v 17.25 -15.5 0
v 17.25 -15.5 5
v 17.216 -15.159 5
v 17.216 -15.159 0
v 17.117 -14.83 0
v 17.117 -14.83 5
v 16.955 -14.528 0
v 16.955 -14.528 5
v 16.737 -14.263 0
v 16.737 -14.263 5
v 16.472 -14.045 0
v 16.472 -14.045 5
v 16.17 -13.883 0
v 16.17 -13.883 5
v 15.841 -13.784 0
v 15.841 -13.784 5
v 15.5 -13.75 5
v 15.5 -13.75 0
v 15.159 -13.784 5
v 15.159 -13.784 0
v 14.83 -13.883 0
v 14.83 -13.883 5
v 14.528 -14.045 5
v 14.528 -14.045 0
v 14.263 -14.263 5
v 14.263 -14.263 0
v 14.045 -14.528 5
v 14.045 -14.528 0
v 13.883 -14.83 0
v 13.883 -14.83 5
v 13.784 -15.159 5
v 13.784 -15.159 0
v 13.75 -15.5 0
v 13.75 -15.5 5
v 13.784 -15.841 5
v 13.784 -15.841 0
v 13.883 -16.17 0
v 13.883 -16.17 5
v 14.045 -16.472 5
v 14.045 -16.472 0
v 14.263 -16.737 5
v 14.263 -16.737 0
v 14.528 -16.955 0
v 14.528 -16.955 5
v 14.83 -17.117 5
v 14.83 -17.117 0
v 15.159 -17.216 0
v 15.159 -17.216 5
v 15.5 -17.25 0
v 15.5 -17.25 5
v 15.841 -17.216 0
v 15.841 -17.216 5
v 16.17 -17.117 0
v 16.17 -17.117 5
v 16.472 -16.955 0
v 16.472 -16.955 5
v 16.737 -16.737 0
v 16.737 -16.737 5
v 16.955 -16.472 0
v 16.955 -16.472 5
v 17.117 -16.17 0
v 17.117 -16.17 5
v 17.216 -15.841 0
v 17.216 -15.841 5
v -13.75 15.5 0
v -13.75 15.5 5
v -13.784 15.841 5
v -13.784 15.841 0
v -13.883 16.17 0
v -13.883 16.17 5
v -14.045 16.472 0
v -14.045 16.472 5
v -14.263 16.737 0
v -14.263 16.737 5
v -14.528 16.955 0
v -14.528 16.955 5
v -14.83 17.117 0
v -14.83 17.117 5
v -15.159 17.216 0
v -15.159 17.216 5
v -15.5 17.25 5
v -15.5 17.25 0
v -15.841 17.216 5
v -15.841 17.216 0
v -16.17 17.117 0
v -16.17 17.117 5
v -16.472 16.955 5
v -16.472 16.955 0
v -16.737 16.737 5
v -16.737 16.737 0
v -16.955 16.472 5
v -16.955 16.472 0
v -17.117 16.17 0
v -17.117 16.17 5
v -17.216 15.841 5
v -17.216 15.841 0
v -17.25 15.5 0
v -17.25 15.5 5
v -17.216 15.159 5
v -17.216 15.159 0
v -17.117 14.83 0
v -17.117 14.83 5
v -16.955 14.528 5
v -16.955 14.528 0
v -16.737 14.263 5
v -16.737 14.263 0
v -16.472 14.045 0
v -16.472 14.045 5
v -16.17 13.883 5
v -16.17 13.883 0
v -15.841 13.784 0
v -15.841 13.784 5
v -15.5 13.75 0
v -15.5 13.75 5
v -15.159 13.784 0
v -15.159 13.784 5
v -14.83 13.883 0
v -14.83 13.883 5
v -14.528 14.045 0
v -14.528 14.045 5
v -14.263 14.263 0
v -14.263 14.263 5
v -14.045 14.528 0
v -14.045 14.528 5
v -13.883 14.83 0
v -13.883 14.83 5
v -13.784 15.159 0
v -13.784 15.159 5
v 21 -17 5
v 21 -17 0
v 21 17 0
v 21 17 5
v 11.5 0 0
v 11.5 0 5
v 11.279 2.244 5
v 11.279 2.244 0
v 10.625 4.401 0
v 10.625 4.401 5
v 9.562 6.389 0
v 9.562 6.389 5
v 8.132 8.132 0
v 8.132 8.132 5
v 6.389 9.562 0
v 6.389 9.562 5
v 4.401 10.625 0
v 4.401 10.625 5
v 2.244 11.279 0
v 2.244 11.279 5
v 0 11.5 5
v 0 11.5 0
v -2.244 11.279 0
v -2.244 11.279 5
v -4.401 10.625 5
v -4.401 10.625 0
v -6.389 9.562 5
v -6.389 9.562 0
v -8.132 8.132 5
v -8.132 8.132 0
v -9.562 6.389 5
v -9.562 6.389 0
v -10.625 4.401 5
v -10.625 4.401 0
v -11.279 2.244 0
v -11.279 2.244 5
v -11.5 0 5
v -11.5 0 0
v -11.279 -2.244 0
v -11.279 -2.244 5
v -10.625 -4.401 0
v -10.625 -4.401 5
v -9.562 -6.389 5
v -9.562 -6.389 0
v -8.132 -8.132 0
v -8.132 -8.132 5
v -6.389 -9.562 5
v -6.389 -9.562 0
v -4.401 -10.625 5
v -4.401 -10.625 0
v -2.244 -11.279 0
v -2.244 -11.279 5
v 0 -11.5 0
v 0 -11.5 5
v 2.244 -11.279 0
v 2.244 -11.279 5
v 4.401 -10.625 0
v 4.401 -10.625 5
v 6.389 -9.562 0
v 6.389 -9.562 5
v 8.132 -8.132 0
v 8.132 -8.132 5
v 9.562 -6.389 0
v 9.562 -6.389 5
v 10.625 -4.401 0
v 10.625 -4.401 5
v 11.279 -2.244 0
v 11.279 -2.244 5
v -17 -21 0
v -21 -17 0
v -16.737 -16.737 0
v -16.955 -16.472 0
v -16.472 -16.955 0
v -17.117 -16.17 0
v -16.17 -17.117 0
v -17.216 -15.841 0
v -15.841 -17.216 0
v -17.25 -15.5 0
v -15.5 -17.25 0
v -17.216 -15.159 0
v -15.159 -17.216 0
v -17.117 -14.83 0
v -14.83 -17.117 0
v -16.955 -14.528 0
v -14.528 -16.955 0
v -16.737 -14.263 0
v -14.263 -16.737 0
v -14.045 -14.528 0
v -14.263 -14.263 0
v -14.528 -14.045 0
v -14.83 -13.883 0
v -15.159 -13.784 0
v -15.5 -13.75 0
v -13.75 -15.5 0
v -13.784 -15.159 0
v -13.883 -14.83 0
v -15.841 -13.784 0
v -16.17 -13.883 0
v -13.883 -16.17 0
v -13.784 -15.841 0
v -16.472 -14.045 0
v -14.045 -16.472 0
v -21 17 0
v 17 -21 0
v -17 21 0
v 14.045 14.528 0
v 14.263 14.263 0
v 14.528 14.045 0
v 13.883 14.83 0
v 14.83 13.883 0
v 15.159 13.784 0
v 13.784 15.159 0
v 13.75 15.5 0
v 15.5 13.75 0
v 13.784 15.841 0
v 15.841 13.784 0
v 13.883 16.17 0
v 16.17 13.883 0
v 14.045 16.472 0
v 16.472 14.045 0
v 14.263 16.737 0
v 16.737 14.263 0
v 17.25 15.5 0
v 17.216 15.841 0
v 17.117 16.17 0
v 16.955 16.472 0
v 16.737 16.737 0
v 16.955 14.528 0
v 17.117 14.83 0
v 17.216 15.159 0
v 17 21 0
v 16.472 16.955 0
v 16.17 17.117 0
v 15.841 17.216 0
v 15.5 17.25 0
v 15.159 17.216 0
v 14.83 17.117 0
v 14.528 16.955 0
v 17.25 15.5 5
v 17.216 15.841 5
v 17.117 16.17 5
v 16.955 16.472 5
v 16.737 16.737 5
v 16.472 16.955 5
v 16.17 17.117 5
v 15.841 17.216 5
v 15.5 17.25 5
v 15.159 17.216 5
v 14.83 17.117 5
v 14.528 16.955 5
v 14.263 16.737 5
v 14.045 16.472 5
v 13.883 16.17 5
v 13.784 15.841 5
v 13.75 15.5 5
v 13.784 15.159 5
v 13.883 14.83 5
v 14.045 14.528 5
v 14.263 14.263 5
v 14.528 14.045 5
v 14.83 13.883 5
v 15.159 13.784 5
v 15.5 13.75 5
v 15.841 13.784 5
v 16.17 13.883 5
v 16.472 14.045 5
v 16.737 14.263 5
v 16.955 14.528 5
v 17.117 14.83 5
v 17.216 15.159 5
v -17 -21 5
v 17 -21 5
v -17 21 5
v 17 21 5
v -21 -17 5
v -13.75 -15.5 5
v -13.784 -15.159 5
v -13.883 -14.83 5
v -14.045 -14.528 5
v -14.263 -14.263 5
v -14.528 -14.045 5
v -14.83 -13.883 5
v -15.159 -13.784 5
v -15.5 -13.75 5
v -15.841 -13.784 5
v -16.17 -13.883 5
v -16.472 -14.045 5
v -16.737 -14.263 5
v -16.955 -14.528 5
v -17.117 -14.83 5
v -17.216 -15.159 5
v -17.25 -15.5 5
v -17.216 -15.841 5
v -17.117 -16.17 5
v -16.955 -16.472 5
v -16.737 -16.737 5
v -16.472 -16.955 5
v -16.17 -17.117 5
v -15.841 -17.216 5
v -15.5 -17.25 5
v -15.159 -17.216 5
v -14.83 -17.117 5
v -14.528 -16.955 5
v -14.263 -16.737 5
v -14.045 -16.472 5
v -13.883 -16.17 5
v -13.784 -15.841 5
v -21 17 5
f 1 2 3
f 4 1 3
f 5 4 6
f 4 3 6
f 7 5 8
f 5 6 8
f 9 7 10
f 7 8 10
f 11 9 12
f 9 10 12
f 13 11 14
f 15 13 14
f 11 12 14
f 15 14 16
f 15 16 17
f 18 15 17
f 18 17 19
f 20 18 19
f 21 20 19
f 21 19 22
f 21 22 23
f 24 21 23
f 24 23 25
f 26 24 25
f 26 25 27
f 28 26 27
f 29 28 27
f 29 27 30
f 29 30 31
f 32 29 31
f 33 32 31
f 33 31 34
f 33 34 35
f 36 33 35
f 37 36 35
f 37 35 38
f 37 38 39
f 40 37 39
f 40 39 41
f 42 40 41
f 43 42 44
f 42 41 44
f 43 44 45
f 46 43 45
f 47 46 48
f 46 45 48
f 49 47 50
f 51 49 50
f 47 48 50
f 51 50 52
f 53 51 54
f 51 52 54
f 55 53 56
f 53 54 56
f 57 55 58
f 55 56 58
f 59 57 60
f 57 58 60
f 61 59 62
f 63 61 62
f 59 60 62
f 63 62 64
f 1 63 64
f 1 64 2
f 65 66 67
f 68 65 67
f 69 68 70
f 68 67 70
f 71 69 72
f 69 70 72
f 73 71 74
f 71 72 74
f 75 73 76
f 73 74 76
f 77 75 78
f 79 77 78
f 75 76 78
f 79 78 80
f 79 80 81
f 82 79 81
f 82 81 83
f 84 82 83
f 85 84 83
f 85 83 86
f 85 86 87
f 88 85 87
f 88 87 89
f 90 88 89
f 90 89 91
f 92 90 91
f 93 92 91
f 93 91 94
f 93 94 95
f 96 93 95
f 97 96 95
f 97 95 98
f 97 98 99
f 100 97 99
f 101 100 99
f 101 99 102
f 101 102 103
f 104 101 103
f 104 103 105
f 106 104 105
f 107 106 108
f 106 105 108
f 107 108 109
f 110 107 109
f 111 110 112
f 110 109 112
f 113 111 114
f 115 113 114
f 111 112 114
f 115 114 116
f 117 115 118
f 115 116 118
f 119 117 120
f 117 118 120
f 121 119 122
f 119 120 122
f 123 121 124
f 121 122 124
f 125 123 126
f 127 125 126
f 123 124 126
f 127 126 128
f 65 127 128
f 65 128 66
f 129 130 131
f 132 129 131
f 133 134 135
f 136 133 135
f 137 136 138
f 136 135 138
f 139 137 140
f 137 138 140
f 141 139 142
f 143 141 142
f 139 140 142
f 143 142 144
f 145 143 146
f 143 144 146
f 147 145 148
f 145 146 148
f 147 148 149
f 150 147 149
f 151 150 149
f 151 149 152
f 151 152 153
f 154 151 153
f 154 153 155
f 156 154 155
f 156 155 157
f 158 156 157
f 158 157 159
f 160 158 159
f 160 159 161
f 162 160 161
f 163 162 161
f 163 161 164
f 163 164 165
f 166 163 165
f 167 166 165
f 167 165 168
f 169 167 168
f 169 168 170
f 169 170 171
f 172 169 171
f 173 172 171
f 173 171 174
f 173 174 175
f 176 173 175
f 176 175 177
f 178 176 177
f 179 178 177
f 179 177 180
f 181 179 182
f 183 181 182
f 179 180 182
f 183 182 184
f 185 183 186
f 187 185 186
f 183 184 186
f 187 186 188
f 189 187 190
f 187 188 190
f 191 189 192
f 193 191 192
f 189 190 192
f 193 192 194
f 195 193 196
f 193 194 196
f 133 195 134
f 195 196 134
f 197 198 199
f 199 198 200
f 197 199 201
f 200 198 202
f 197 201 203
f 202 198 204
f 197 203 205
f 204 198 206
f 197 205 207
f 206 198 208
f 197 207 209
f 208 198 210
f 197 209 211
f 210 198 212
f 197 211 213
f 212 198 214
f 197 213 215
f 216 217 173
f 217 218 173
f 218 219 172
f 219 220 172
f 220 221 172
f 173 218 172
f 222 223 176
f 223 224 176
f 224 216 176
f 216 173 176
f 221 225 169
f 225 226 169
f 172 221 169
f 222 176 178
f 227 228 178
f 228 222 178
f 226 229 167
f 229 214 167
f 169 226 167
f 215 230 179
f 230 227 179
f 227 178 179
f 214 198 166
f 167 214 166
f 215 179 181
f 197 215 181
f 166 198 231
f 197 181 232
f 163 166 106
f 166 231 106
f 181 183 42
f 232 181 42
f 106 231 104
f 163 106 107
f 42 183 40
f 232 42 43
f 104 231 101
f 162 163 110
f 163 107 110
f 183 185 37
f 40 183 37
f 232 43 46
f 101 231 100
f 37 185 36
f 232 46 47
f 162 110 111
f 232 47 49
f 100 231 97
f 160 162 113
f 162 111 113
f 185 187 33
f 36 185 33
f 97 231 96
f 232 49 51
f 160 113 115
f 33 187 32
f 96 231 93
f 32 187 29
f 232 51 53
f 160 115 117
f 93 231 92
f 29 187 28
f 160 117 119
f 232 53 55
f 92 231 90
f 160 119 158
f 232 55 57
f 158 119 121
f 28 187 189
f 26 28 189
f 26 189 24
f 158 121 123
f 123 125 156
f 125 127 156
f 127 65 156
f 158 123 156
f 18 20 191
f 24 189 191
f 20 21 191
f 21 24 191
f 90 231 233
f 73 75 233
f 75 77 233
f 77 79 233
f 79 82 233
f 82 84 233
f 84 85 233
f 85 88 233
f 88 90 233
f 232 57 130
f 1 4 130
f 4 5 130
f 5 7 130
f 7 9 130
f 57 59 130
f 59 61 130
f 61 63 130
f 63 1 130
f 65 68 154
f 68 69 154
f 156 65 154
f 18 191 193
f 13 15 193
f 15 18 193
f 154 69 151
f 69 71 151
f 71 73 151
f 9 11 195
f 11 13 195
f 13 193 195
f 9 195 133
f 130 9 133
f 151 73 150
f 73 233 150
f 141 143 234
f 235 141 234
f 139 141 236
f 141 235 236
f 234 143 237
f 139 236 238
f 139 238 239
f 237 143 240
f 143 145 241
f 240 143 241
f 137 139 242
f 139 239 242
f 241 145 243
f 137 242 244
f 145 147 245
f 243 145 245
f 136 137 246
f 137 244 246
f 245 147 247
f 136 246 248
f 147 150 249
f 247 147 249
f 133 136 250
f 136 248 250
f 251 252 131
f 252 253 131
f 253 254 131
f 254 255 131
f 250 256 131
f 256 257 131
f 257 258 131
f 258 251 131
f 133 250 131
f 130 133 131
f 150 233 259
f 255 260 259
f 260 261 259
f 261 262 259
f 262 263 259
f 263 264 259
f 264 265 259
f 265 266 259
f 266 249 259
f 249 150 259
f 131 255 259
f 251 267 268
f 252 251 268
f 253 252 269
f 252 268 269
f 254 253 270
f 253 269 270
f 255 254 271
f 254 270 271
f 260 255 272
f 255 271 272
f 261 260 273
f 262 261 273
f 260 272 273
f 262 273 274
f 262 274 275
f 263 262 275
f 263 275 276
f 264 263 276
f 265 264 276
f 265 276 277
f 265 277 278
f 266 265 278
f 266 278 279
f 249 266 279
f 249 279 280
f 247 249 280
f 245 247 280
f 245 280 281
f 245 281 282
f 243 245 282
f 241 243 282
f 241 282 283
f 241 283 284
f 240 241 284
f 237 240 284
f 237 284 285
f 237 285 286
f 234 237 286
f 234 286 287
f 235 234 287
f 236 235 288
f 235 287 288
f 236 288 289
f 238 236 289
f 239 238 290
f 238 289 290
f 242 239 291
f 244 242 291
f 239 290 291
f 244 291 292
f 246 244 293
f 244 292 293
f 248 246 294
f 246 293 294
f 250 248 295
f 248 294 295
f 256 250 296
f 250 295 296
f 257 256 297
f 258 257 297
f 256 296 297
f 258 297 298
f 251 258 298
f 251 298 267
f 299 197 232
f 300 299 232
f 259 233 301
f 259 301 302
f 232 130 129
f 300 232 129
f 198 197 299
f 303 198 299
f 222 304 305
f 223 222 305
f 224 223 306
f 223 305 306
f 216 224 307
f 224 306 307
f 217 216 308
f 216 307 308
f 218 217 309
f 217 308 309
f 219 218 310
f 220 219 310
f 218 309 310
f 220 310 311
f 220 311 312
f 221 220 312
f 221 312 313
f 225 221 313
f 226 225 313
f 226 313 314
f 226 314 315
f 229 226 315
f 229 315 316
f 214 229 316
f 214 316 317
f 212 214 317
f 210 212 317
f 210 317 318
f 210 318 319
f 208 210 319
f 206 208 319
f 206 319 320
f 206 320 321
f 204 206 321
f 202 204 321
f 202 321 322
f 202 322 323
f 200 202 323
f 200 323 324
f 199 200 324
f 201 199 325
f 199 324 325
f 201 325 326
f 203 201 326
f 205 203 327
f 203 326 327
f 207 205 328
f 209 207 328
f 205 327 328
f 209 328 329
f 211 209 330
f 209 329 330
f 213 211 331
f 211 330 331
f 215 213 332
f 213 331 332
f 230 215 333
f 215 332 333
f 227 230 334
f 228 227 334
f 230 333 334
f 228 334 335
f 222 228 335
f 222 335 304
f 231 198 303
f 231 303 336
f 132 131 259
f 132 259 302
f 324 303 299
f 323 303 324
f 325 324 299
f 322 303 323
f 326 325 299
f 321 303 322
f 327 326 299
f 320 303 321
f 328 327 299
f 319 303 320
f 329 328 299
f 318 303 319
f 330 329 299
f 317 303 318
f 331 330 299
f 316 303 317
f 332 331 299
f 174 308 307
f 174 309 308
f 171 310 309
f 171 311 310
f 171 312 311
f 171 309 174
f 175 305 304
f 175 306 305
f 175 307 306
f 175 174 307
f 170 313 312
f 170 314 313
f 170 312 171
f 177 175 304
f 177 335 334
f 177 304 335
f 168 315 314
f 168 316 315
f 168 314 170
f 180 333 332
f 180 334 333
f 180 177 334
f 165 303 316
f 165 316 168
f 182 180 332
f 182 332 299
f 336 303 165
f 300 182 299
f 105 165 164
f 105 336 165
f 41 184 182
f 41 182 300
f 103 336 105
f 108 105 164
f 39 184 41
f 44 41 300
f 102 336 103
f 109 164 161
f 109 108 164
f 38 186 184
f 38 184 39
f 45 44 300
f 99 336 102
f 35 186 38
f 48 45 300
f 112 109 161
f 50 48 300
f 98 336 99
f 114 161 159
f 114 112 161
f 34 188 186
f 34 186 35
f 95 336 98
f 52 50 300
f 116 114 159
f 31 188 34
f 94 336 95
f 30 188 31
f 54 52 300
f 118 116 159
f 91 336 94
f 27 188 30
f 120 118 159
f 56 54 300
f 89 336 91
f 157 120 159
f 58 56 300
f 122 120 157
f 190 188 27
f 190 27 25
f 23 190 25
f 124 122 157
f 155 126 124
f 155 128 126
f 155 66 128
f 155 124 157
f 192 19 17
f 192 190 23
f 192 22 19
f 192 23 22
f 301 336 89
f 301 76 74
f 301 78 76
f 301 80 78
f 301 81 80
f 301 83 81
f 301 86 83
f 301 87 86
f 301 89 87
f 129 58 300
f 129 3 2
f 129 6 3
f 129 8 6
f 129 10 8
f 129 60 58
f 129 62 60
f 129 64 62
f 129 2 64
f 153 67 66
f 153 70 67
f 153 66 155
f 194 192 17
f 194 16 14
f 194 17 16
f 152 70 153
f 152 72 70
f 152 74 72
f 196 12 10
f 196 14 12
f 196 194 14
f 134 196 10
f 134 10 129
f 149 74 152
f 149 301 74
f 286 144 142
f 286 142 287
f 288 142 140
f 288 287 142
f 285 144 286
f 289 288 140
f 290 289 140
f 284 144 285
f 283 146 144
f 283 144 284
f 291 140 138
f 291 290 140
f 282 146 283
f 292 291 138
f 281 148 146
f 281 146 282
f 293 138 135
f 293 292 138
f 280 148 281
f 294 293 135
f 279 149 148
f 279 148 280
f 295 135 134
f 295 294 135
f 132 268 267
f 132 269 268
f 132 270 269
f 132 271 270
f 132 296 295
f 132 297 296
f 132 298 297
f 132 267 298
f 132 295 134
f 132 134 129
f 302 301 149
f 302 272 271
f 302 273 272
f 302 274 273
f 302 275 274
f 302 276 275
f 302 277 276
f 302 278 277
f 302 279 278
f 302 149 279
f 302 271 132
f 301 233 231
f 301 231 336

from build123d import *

# Parameters (mm, degrees)
SKETCH_W        = 42
SKETCH_H        = 42
PAD_DEPTH       = 5
SKETCH001_R     = 11.5
POCKET_DEPTH    = 12
SKETCH002_R     = 1.75
POCKET001_DEPTH = 12
CHAMFER_SIZE    = 4


with BuildPart() as part:
    # Sketch → Pad (new body)
    with BuildSketch(Plane.XY):
        Rectangle(SKETCH_W, SKETCH_H)
    extrude(amount=PAD_DEPTH)

    # Sketch001 (on Face6 of Pad) → Pocket (cut)
    with BuildSketch(Plane.XY.offset(5)):
        Circle(SKETCH001_R)
    extrude(amount=-POCKET_DEPTH, mode=Mode.SUBTRACT)

    # Sketch002 (on Face5 of Pocket) → Pocket001 (cut)
    with BuildSketch(Plane.XY.offset(5)):
        with Locations((15.5, 15.5)):
            Circle(SKETCH002_R)
        with Locations((-15.5, 15.5)):
            Circle(SKETCH002_R)
        with Locations((-15.5, -15.5)):
            Circle(SKETCH002_R)
        with Locations((15.5, -15.5)):
            Circle(SKETCH002_R)
    extrude(amount=-POCKET001_DEPTH, mode=Mode.SUBTRACT)

    # Chamfer
    chamfer_edges = [part.edges().sort_by_distance(p)[0] for p in [
        (21, 21, 2.5),
        (-21, 21, 2.5),
        (-21, -21, 2.5),
        (21, -21, 2.5),
    ]]
    chamfer(chamfer_edges, length=CHAMFER_SIZE)


solid = part.part
